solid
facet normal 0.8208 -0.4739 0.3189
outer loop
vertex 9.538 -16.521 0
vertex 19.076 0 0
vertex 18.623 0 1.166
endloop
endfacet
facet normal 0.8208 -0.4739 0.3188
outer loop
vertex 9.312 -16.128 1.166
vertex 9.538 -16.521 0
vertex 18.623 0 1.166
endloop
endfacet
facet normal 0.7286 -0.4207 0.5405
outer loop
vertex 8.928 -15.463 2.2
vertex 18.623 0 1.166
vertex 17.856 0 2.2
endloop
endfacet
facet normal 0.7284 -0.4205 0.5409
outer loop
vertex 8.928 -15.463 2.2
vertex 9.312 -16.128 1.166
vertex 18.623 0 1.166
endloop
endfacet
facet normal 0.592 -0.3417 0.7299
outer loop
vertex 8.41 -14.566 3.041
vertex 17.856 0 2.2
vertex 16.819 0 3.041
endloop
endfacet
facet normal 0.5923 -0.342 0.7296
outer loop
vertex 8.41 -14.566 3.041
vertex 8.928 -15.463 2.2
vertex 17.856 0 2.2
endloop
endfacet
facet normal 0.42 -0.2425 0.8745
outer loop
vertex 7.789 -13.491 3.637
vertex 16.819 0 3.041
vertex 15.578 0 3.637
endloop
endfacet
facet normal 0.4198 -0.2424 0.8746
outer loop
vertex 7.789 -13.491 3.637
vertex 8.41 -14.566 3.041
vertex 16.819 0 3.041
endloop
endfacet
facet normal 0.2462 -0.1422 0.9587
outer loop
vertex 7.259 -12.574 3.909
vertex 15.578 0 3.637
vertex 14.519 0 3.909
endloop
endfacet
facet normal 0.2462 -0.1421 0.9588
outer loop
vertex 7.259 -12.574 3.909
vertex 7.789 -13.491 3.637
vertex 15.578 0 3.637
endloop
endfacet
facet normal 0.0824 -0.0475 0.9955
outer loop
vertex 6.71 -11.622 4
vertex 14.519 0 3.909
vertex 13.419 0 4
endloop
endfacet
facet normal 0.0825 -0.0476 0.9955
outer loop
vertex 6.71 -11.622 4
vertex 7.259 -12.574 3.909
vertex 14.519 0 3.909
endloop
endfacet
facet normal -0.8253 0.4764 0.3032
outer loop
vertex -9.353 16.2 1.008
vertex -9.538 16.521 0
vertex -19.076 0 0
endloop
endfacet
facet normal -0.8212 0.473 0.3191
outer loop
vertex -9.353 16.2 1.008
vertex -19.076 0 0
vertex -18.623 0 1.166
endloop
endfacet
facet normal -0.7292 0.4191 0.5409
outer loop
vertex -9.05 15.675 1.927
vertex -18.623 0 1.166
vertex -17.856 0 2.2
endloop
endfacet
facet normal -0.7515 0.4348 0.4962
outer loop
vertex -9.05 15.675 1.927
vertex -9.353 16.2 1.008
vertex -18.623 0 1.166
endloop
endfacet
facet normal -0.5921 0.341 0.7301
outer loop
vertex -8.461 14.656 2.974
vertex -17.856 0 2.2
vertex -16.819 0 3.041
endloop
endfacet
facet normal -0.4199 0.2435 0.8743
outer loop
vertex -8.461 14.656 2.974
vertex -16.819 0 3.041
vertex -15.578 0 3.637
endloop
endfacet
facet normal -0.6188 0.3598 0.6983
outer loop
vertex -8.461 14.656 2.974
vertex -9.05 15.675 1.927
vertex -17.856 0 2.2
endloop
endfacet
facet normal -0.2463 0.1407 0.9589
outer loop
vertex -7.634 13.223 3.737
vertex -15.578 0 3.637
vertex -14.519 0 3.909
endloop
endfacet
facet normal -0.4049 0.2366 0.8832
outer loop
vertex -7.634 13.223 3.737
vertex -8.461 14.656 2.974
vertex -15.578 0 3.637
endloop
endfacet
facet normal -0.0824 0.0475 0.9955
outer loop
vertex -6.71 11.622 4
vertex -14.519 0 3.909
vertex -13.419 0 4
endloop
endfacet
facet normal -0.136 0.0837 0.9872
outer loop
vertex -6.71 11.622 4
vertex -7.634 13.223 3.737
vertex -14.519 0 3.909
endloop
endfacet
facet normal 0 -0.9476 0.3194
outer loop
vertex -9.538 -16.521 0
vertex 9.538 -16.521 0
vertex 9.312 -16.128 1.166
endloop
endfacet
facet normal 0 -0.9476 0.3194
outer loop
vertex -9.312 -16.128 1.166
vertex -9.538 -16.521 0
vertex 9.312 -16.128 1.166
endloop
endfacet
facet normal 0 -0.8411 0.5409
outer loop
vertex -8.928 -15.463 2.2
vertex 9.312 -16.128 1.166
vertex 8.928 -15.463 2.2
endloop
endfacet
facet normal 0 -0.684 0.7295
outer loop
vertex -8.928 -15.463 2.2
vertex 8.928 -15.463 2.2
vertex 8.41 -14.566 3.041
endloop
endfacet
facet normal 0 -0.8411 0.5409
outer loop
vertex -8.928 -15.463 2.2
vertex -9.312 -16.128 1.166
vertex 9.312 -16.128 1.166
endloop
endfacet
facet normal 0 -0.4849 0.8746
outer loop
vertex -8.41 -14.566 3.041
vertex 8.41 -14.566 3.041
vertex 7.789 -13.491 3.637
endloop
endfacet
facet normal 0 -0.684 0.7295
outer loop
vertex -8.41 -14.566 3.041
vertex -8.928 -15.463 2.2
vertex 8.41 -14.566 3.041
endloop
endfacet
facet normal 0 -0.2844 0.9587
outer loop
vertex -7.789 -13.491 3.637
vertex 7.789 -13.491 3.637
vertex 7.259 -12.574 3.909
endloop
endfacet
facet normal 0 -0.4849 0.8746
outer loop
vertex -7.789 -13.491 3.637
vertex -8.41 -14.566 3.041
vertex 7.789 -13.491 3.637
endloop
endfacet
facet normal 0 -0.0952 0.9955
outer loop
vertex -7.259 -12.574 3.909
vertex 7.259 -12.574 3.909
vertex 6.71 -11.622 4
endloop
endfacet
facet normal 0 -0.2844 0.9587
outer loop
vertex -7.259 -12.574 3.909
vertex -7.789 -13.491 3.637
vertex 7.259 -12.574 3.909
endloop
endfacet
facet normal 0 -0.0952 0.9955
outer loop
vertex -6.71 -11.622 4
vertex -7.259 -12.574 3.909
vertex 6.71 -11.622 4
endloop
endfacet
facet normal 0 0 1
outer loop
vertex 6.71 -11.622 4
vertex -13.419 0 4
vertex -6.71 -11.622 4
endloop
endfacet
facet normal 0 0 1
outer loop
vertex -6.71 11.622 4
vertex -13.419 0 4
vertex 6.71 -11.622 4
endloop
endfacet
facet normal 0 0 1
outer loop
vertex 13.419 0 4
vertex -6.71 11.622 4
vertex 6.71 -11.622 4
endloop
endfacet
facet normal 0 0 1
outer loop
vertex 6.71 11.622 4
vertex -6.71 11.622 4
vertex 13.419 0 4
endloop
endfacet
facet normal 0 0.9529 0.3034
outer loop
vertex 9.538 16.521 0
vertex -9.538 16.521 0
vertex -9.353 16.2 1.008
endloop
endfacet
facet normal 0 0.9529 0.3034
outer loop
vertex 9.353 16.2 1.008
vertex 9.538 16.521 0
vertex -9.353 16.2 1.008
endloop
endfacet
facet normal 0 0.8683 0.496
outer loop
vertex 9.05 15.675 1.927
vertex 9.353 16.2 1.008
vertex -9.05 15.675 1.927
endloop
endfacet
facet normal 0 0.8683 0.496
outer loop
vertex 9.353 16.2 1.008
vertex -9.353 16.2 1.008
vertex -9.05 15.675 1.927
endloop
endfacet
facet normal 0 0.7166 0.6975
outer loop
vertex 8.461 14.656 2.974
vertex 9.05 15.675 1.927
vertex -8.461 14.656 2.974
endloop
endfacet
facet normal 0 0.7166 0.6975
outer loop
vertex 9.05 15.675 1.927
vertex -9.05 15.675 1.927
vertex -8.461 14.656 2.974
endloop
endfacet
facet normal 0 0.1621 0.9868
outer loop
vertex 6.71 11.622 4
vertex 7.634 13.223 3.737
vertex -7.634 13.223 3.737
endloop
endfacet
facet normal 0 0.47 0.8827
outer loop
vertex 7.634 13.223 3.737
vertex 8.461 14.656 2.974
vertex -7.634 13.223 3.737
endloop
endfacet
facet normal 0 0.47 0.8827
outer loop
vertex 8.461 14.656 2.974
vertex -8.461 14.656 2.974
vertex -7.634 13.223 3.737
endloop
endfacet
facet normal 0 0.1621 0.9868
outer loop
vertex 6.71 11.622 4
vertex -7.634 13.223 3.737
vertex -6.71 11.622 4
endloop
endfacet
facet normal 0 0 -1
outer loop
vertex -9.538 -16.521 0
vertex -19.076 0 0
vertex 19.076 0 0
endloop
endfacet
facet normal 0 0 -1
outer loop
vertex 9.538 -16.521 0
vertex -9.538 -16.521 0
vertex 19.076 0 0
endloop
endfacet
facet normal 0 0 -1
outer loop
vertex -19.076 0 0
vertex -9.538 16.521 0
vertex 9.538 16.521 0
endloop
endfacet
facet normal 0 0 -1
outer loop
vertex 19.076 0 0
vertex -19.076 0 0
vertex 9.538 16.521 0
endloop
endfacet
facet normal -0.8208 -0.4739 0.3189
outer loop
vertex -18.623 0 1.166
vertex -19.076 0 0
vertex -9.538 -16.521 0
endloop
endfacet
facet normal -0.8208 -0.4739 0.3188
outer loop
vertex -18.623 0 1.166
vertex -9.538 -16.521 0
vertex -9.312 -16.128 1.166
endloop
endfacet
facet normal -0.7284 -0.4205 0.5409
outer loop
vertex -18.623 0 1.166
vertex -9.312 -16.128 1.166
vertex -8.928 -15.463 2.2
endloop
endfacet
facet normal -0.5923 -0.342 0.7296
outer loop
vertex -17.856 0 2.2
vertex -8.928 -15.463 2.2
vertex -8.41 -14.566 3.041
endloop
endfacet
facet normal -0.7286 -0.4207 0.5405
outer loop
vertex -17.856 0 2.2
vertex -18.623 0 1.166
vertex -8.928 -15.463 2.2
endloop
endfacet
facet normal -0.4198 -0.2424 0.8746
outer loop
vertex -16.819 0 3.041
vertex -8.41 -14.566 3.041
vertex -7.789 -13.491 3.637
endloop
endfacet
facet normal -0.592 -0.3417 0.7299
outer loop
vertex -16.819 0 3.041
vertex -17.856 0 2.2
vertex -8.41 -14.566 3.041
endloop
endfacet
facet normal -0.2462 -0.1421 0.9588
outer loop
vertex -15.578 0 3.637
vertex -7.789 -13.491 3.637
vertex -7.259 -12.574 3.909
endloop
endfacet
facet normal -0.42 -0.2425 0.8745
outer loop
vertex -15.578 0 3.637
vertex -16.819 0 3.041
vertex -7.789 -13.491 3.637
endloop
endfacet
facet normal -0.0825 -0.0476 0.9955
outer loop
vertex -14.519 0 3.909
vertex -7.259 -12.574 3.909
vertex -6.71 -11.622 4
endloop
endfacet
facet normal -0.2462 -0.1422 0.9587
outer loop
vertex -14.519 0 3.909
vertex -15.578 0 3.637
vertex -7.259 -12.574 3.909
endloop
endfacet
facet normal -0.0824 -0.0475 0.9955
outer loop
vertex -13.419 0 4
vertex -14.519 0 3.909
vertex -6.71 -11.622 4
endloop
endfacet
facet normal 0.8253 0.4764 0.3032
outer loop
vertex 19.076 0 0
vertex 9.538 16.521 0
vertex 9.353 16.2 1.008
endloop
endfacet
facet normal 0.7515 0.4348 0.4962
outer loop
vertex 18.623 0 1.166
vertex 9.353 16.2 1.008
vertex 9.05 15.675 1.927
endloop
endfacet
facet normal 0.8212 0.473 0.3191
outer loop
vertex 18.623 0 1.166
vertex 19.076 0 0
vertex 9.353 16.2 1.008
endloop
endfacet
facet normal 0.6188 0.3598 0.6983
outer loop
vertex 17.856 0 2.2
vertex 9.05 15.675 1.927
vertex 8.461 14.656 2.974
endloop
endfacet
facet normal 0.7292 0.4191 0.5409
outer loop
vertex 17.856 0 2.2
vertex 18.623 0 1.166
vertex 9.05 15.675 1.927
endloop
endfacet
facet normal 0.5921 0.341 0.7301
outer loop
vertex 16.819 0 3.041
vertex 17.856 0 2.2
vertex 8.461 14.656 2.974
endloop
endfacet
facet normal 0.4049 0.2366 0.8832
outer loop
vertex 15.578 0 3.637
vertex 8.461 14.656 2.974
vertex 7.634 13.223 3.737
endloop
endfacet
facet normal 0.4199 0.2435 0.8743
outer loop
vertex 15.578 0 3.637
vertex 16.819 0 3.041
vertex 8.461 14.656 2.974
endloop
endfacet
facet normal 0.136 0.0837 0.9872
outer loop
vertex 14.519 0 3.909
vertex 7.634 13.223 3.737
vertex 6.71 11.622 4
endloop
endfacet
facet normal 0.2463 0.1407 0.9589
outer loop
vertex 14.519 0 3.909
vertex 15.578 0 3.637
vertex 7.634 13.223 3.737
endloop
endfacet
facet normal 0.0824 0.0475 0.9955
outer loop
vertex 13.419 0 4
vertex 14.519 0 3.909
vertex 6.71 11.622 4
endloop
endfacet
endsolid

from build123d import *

# Parameters (mm, degrees)
F1_DEPTH    = 4
F2_T1_DEPTH = 43.5711374279
F2_T3_DEPTH = 43.5711374279
F2_T5_DEPTH = 43.5711374279
F2_T7_DEPTH = 43.5711374279
F2_T9_DEPTH = 43.5711374279


# Not quite as in the source:
# - a fillet or chamfer that OpenCascade refuses, or shapes differently, is made with other operations: its cross-section is extruded or revolved along the edge and cut away or added


with BuildPart() as f1:
    # F0 (on Top) → F1 (new body)
    with BuildSketch(Plane.XY):
        Polygon((-9.53812, 16.5205084487), (0, 0), (9.53812, 16.5205084487), align=None)
        Polygon((-19.07624, 0), (0, 0), (-9.53812, 16.5205084487), align=None)
        Polygon((-9.53812, -16.5205084487), (0, 0), (-19.07624, 0), align=None)
        Polygon((9.53812, -16.5205084487), (0, 0), (-9.53812, -16.5205084487), align=None)
        Polygon((19.07624, 0), (0, 0), (9.53812, -16.5205084487), align=None)
        Polygon((9.53812, 16.5205084487), (0, 0), (19.07624, 0), align=None)
    extrude(amount=F1_DEPTH)

    # F2: fillet of radius 5 on 6 edges, made by hand

    # F2_s2 → F2_t1 (cut)
    with BuildSketch(Plane.YZ.offset(-21.7855687139)):
        with BuildLine():
            ThreePointArc((16.5205084487, 0), (14.7838066233, 2.8729833462), (11.6215289631, 4))
            Line((11.6215289631, 4), (16.5205084487, 4))
            Line((16.5205084487, 4), (16.5205084487, 0))
        make_face()
        with BuildLine():
            ThreePointArc((-16.5205084487, 0), (-14.7838066233, 2.8729833462), (-11.6215289631, 4))
            Line((-11.6215289631, 4), (-16.5205084487, 4))
            Line((-16.5205084487, 4), (-16.5205084487, 0))
        make_face()
    extrude(amount=F2_T1_DEPTH, mode=Mode.SUBTRACT)

    # F2_s4 → F2_t3 (cut)
    with BuildSketch(Plane(origin=(10.892784357, 18.8668559422, 0), x_dir=(0, 0, 1), z_dir=(-0.5, -0.8660254038, 0))):
        with BuildLine():
            ThreePointArc((0, 16.5205084487), (2.8729833462, 14.7838066233), (4, 11.6215289631))
            Line((4, 11.6215289631), (4, 16.5205084487))
            Line((4, 16.5205084487), (0, 16.5205084487))
        make_face()
    extrude(amount=F2_T3_DEPTH, mode=Mode.SUBTRACT)

    # F2_s6 → F2_t5 (cut)
    with BuildSketch(Plane(origin=(-10.892784357, 18.8668559422, 0), x_dir=(0, 0, 1), z_dir=(0.5, -0.8660254038, 0))):
        with BuildLine():
            ThreePointArc((0, 16.5205084487), (2.8729833462, 14.7838066233), (4, 11.6215289631))
            Line((4, 11.6215289631), (4, 16.5205084487))
            Line((4, 16.5205084487), (0, 16.5205084487))
        make_face()
    extrude(amount=F2_T5_DEPTH, mode=Mode.SUBTRACT)

    # F2_s8 → F2_t7 (cut)
    with BuildSketch(Plane(origin=(10.892784357, -18.8668559422, 0), x_dir=(0, 0, 1), z_dir=(-0.5, 0.8660254038, 0))):
        with BuildLine():
            ThreePointArc((0, 16.5205084487), (2.8729833462, 14.7838066233), (4, 11.6215289631))
            Line((4, 11.6215289631), (4, 16.5205084487))
            Line((4, 16.5205084487), (0, 16.5205084487))
        make_face()
    extrude(amount=F2_T7_DEPTH, mode=Mode.SUBTRACT)

    # F2_s10 → F2_t9 (cut)
    with BuildSketch(Plane(origin=(-10.892784357, -18.8668559422, 0), x_dir=(0, 0, 1), z_dir=(0.5, 0.8660254038, 0))):
        with BuildLine():
            ThreePointArc((0, 16.5205084487), (2.8729833462, 14.7838066233), (4, 11.6215289631))
            Line((4, 11.6215289631), (4, 16.5205084487))
            Line((4, 16.5205084487), (0, 16.5205084487))
        make_face()
    extrude(amount=F2_T9_DEPTH, mode=Mode.SUBTRACT)


solid = f1.part
